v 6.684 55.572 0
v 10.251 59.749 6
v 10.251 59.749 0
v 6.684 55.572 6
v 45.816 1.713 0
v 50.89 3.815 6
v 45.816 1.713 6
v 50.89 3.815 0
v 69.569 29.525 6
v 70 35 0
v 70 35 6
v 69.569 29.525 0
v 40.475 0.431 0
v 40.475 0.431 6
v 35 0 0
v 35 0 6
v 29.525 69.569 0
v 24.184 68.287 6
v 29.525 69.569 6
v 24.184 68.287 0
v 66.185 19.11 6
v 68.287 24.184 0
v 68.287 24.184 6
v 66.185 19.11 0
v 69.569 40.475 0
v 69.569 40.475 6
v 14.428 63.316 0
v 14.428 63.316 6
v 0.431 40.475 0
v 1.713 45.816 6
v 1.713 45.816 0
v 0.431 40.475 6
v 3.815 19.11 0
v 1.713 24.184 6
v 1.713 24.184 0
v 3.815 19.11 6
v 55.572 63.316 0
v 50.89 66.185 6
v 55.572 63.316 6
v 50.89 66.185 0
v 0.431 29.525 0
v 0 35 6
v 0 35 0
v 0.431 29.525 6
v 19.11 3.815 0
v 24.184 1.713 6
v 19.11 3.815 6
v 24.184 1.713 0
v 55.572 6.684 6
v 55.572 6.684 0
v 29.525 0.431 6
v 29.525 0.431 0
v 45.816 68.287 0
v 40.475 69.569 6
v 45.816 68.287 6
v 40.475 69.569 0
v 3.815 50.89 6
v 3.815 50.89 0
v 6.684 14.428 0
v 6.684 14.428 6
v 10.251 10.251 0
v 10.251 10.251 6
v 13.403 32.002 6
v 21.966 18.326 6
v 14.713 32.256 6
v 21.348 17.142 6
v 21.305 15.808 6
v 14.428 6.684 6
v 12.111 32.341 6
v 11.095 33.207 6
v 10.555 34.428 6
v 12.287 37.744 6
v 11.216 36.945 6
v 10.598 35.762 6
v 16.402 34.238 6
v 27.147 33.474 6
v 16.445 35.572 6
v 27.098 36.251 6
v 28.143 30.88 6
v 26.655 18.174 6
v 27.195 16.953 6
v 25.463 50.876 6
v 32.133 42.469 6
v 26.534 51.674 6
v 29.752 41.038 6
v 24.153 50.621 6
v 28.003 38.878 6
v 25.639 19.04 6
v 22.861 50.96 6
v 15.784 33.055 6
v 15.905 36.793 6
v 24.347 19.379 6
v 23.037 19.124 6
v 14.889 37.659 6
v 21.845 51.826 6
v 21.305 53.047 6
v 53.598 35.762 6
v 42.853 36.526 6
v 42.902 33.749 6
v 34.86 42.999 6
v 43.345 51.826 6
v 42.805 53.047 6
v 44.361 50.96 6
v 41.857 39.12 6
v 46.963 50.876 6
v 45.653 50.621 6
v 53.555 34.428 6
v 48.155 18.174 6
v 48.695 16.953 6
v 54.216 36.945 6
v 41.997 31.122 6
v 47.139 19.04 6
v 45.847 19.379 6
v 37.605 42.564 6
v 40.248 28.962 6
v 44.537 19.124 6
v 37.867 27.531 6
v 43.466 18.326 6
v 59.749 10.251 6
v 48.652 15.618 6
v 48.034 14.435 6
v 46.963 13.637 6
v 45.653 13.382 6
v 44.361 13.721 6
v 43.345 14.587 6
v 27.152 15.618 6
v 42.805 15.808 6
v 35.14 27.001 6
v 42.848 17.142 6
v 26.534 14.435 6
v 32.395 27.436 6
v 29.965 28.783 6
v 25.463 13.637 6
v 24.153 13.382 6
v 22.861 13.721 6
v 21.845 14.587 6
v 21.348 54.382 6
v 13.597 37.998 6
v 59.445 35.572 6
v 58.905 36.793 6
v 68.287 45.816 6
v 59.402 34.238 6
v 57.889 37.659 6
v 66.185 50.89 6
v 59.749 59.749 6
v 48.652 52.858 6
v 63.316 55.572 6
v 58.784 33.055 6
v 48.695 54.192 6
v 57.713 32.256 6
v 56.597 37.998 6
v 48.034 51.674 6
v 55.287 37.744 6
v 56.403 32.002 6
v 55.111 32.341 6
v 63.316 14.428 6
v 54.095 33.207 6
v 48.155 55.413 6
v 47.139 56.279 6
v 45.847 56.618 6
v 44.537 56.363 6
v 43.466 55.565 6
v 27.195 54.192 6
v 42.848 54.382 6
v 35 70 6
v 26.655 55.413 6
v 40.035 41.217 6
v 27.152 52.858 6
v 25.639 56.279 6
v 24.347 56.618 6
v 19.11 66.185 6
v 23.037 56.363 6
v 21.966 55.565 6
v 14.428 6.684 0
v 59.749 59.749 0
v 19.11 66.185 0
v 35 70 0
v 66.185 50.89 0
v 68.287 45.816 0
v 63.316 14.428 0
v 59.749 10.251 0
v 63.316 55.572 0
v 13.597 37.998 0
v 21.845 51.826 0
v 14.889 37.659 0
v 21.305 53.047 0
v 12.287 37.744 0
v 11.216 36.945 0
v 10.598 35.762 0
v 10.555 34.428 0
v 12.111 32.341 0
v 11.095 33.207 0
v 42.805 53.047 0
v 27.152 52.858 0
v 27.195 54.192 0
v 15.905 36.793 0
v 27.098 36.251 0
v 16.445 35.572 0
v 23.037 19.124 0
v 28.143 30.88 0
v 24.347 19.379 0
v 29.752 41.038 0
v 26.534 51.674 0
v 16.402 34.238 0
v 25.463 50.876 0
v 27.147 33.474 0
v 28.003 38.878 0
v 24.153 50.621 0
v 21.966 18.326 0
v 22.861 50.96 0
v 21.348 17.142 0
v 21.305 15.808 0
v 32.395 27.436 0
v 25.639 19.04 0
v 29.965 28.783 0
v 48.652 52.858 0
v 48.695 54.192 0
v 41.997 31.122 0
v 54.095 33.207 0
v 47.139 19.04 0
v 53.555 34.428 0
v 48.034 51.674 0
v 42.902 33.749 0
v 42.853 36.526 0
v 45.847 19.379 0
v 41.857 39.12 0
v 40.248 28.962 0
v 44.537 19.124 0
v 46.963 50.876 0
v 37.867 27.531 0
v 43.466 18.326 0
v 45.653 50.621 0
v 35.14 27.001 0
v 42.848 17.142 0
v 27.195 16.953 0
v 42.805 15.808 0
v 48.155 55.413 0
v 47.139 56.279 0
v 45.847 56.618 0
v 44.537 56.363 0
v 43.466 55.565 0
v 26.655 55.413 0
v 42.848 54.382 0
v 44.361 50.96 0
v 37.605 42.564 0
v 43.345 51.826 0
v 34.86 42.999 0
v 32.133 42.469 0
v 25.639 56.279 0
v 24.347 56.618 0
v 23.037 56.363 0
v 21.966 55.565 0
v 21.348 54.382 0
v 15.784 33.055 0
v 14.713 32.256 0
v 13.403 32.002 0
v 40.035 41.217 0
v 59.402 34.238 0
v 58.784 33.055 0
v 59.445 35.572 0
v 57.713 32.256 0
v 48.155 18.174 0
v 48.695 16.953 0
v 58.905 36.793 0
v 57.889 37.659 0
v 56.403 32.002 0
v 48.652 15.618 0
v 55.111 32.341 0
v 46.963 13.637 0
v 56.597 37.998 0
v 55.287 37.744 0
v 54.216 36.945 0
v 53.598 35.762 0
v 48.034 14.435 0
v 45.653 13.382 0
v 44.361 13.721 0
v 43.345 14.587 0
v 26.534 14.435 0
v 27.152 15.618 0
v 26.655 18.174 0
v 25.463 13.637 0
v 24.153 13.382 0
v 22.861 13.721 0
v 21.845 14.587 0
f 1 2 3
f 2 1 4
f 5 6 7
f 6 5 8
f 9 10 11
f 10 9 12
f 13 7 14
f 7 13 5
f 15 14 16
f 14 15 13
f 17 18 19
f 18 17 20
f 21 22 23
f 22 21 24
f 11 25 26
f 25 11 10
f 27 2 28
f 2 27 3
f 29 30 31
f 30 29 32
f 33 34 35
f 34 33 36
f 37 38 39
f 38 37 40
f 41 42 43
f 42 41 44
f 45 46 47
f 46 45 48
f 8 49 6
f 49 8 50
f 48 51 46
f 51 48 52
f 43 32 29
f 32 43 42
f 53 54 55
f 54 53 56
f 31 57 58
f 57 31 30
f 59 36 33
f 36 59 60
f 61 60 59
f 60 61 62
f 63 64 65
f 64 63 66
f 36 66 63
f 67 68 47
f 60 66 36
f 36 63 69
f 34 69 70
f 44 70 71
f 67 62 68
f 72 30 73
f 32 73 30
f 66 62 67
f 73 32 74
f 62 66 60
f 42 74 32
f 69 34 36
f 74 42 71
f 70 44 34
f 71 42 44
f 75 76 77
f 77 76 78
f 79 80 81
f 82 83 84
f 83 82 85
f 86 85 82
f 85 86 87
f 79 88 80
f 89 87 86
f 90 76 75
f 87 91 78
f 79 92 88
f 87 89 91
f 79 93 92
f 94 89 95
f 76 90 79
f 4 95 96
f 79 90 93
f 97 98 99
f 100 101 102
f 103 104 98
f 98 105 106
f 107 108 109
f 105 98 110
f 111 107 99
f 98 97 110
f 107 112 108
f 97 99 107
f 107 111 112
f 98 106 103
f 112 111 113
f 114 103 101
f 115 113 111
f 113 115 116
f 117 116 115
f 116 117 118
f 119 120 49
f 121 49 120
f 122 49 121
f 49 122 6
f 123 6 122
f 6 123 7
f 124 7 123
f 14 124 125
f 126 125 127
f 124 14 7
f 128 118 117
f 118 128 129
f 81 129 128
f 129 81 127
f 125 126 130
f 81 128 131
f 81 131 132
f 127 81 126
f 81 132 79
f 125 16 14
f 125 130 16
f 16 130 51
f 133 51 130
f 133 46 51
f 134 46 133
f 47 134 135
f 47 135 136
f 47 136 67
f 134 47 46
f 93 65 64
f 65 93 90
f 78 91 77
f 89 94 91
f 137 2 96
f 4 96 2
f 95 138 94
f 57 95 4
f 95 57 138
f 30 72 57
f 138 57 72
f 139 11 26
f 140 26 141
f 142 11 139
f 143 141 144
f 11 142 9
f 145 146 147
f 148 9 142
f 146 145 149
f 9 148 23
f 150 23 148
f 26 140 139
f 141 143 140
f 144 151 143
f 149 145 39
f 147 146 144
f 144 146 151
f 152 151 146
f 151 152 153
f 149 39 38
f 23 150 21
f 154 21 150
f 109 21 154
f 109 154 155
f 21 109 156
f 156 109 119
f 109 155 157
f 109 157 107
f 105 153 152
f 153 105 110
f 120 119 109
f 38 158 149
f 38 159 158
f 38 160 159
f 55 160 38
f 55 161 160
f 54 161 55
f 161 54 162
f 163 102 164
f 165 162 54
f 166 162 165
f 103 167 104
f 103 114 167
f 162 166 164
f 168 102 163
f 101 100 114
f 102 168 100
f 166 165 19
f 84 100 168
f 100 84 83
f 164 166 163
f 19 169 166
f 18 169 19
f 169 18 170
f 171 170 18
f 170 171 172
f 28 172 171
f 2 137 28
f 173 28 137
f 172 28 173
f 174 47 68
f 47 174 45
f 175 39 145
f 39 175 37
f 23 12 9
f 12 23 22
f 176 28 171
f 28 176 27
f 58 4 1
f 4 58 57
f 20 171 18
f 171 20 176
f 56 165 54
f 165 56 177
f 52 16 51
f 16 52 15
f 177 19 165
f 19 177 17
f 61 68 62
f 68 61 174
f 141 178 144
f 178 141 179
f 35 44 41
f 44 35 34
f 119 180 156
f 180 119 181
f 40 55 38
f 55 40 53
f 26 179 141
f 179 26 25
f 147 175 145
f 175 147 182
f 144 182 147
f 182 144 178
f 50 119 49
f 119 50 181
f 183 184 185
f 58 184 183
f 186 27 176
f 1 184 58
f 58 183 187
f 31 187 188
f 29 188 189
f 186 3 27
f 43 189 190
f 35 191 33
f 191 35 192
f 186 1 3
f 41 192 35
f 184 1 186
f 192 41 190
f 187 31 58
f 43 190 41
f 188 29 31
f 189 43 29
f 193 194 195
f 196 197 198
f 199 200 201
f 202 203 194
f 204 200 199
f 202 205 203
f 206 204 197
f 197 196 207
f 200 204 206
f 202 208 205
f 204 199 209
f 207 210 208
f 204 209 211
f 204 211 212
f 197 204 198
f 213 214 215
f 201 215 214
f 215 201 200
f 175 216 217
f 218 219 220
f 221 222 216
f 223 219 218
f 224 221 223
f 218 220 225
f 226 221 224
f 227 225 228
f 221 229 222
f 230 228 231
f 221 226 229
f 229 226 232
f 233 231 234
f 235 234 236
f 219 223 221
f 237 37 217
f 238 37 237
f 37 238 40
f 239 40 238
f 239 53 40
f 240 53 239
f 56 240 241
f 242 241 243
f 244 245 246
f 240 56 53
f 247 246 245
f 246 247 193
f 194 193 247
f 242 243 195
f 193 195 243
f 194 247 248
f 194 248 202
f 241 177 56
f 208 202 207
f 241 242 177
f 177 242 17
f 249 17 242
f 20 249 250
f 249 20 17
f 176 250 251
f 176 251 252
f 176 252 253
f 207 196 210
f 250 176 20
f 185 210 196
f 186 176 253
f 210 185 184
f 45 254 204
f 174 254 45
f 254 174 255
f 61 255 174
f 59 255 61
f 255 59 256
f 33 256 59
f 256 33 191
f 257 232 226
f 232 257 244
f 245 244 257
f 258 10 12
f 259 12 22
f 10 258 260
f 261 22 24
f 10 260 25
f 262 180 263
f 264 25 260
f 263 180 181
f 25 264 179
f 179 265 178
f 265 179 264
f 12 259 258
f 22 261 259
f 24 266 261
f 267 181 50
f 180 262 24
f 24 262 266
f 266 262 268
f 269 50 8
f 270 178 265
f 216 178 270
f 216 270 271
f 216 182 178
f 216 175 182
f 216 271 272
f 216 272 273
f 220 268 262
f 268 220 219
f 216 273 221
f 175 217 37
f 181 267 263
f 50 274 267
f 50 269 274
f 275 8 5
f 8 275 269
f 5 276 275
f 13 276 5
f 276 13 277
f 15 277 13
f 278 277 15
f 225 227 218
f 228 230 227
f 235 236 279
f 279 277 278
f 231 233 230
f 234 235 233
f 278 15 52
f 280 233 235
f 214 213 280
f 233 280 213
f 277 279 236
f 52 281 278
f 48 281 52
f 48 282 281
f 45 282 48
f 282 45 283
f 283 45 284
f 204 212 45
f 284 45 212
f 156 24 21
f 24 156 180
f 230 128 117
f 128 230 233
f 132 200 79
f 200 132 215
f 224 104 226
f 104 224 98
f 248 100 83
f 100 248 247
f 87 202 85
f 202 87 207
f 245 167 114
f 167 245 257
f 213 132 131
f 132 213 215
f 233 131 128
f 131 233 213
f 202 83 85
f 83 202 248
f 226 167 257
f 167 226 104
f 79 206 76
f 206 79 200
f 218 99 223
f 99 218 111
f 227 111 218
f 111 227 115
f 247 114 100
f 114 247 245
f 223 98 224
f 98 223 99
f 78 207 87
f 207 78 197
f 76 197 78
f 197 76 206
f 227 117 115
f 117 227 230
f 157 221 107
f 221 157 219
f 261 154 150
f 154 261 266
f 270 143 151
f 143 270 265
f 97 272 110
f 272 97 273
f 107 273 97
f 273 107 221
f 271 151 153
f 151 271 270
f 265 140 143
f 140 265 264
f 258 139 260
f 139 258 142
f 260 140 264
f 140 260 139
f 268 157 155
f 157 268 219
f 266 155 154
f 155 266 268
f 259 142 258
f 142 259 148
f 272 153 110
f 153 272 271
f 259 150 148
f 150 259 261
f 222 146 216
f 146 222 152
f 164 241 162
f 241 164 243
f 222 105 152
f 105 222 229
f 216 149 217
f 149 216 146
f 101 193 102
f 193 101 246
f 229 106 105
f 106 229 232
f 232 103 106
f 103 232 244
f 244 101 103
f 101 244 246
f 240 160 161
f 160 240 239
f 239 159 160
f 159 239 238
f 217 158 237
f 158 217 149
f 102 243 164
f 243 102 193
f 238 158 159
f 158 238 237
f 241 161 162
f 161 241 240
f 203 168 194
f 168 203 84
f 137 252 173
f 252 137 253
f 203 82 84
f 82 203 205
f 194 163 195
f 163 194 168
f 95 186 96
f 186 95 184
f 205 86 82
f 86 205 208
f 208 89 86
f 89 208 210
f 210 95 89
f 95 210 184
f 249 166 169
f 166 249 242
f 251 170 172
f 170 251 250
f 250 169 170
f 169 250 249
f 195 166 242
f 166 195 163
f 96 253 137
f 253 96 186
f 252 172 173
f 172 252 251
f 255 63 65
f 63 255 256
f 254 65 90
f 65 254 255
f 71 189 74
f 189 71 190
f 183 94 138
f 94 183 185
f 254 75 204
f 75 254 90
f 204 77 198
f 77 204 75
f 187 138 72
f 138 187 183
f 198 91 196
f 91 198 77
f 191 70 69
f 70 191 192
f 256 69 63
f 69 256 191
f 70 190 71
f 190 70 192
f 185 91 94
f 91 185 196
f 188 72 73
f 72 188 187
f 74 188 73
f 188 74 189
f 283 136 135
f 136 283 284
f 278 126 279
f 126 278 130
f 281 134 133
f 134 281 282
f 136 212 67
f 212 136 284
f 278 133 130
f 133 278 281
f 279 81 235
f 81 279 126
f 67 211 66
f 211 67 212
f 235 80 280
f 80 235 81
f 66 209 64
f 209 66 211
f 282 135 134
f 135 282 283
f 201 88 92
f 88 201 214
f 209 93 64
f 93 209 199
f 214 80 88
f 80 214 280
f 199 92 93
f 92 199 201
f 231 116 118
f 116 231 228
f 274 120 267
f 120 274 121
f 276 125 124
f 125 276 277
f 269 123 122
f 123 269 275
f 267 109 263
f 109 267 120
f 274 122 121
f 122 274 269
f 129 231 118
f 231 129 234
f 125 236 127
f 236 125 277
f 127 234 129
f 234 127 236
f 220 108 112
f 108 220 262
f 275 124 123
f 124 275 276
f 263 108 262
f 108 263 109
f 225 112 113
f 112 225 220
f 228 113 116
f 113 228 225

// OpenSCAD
$fn = 32;

// ----------------------------------------------------------------------
// Spacer plate: round flange R35, 6 bolts
// ----------------------------------------------------------------------

// --- parameters (mm) ---
bore_r = 8;               // centre bore radius
bolt_r = 3;               // bolt hole radius
plate_t = 6;              // plate thickness, Z (extrusion height)
flange_r = 35;            // flange radius
n_bolt = 6;               // bolt hole count
ring_r = 21.5;            // bolt circle radius

profile = [[70, 35], [69.569, 40.475], [68.287, 45.816], [66.185, 50.89], [63.316, 55.572], [59.749, 59.749], [55.572, 63.316], [50.89, 66.185], [45.816, 68.287], [40.475, 69.569], [35, 70], [29.525, 69.569], [24.184, 68.287], [19.11, 66.185], [14.428, 63.316], [10.251, 59.749], [6.684, 55.572], [3.815, 50.89], [1.713, 45.816], [0.431, 40.475], [0, 35], [0.431, 29.525], [1.713, 24.184], [3.815, 19.11], [6.684, 14.428], [10.251, 10.251], [14.428, 6.684], [19.11, 3.815], [24.184, 1.713], [29.525, 0.431], [35, 0], [40.475, 0.431], [45.816, 1.713], [50.89, 3.815], [55.572, 6.684], [59.749, 10.251], [63.316, 14.428], [66.185, 19.11], [68.287, 24.184], [69.569, 29.525]];  // primary outline, 40 points, counter clockwise
void_1 = [[42.853, 36.526], [41.857, 39.12], [40.035, 41.217], [37.605, 42.564], [34.86, 42.999], [32.133, 42.469], [29.752, 41.038], [28.003, 38.878], [27.098, 36.251], [27.147, 33.474], [28.143, 30.88], [29.965, 28.783], [32.395, 27.436], [35.14, 27.001], [37.867, 27.531], [40.248, 28.962], [41.997, 31.122], [42.902, 33.749]];  // centre bore, 18 points
void_2 = [[59.445, 35.572], [58.905, 36.793], [57.889, 37.659], [56.597, 37.998], [55.287, 37.744], [54.216, 36.945], [53.598, 35.762], [53.555, 34.428], [54.095, 33.207], [55.111, 32.341], [56.403, 32.002], [57.713, 32.256], [58.784, 33.055], [59.402, 34.238]];  // bolt hole 1, 14 points
void_3 = [[48.695, 54.192], [48.155, 55.413], [47.139, 56.279], [45.847, 56.618], [44.537, 56.363], [43.466, 55.565], [42.848, 54.382], [42.805, 53.047], [43.345, 51.826], [44.361, 50.96], [45.653, 50.621], [46.963, 50.876], [48.034, 51.674], [48.652, 52.858]];  // bolt hole 2, 14 points
void_4 = [[27.195, 54.192], [26.655, 55.413], [25.639, 56.279], [24.347, 56.618], [23.037, 56.363], [21.966, 55.565], [21.348, 54.382], [21.305, 53.047], [21.845, 51.826], [22.861, 50.96], [24.153, 50.621], [25.463, 50.876], [26.534, 51.674], [27.152, 52.858]];  // bolt hole 3, 14 points
void_5 = [[16.445, 35.572], [15.905, 36.793], [14.889, 37.659], [13.597, 37.998], [12.287, 37.744], [11.216, 36.945], [10.598, 35.762], [10.555, 34.428], [11.095, 33.207], [12.111, 32.341], [13.403, 32.002], [14.713, 32.256], [15.784, 33.055], [16.402, 34.238]];  // bolt hole 4, 14 points
void_6 = [[27.195, 16.953], [26.655, 18.174], [25.639, 19.04], [24.347, 19.379], [23.037, 19.124], [21.966, 18.326], [21.348, 17.142], [21.305, 15.808], [21.845, 14.587], [22.861, 13.721], [24.153, 13.382], [25.463, 13.637], [26.534, 14.435], [27.152, 15.618]];  // bolt hole 5, 14 points
void_7 = [[48.695, 16.953], [48.155, 18.174], [47.139, 19.04], [45.847, 19.379], [44.537, 19.124], [43.466, 18.326], [42.848, 17.142], [42.805, 15.808], [43.345, 14.587], [44.361, 13.721], [45.653, 13.382], [46.963, 13.637], [48.034, 14.435], [48.652, 15.618]];  // bolt hole 6, 14 points

// --- the one profile operation ---
difference() {
  linear_extrude(height = plate_t) polygon(points = profile);
  translate([0, 0, -1])
    linear_extrude(height = plate_t + 2) polygon(points = void_1);
  translate([0, 0, -1])
    linear_extrude(height = plate_t + 2) polygon(points = void_2);
  translate([0, 0, -1])
    linear_extrude(height = plate_t + 2) polygon(points = void_3);
  translate([0, 0, -1])
    linear_extrude(height = plate_t + 2) polygon(points = void_4);
  translate([0, 0, -1])
    linear_extrude(height = plate_t + 2) polygon(points = void_5);
  translate([0, 0, -1])
    linear_extrude(height = plate_t + 2) polygon(points = void_6);
  translate([0, 0, -1])
    linear_extrude(height = plate_t + 2) polygon(points = void_7);
}
